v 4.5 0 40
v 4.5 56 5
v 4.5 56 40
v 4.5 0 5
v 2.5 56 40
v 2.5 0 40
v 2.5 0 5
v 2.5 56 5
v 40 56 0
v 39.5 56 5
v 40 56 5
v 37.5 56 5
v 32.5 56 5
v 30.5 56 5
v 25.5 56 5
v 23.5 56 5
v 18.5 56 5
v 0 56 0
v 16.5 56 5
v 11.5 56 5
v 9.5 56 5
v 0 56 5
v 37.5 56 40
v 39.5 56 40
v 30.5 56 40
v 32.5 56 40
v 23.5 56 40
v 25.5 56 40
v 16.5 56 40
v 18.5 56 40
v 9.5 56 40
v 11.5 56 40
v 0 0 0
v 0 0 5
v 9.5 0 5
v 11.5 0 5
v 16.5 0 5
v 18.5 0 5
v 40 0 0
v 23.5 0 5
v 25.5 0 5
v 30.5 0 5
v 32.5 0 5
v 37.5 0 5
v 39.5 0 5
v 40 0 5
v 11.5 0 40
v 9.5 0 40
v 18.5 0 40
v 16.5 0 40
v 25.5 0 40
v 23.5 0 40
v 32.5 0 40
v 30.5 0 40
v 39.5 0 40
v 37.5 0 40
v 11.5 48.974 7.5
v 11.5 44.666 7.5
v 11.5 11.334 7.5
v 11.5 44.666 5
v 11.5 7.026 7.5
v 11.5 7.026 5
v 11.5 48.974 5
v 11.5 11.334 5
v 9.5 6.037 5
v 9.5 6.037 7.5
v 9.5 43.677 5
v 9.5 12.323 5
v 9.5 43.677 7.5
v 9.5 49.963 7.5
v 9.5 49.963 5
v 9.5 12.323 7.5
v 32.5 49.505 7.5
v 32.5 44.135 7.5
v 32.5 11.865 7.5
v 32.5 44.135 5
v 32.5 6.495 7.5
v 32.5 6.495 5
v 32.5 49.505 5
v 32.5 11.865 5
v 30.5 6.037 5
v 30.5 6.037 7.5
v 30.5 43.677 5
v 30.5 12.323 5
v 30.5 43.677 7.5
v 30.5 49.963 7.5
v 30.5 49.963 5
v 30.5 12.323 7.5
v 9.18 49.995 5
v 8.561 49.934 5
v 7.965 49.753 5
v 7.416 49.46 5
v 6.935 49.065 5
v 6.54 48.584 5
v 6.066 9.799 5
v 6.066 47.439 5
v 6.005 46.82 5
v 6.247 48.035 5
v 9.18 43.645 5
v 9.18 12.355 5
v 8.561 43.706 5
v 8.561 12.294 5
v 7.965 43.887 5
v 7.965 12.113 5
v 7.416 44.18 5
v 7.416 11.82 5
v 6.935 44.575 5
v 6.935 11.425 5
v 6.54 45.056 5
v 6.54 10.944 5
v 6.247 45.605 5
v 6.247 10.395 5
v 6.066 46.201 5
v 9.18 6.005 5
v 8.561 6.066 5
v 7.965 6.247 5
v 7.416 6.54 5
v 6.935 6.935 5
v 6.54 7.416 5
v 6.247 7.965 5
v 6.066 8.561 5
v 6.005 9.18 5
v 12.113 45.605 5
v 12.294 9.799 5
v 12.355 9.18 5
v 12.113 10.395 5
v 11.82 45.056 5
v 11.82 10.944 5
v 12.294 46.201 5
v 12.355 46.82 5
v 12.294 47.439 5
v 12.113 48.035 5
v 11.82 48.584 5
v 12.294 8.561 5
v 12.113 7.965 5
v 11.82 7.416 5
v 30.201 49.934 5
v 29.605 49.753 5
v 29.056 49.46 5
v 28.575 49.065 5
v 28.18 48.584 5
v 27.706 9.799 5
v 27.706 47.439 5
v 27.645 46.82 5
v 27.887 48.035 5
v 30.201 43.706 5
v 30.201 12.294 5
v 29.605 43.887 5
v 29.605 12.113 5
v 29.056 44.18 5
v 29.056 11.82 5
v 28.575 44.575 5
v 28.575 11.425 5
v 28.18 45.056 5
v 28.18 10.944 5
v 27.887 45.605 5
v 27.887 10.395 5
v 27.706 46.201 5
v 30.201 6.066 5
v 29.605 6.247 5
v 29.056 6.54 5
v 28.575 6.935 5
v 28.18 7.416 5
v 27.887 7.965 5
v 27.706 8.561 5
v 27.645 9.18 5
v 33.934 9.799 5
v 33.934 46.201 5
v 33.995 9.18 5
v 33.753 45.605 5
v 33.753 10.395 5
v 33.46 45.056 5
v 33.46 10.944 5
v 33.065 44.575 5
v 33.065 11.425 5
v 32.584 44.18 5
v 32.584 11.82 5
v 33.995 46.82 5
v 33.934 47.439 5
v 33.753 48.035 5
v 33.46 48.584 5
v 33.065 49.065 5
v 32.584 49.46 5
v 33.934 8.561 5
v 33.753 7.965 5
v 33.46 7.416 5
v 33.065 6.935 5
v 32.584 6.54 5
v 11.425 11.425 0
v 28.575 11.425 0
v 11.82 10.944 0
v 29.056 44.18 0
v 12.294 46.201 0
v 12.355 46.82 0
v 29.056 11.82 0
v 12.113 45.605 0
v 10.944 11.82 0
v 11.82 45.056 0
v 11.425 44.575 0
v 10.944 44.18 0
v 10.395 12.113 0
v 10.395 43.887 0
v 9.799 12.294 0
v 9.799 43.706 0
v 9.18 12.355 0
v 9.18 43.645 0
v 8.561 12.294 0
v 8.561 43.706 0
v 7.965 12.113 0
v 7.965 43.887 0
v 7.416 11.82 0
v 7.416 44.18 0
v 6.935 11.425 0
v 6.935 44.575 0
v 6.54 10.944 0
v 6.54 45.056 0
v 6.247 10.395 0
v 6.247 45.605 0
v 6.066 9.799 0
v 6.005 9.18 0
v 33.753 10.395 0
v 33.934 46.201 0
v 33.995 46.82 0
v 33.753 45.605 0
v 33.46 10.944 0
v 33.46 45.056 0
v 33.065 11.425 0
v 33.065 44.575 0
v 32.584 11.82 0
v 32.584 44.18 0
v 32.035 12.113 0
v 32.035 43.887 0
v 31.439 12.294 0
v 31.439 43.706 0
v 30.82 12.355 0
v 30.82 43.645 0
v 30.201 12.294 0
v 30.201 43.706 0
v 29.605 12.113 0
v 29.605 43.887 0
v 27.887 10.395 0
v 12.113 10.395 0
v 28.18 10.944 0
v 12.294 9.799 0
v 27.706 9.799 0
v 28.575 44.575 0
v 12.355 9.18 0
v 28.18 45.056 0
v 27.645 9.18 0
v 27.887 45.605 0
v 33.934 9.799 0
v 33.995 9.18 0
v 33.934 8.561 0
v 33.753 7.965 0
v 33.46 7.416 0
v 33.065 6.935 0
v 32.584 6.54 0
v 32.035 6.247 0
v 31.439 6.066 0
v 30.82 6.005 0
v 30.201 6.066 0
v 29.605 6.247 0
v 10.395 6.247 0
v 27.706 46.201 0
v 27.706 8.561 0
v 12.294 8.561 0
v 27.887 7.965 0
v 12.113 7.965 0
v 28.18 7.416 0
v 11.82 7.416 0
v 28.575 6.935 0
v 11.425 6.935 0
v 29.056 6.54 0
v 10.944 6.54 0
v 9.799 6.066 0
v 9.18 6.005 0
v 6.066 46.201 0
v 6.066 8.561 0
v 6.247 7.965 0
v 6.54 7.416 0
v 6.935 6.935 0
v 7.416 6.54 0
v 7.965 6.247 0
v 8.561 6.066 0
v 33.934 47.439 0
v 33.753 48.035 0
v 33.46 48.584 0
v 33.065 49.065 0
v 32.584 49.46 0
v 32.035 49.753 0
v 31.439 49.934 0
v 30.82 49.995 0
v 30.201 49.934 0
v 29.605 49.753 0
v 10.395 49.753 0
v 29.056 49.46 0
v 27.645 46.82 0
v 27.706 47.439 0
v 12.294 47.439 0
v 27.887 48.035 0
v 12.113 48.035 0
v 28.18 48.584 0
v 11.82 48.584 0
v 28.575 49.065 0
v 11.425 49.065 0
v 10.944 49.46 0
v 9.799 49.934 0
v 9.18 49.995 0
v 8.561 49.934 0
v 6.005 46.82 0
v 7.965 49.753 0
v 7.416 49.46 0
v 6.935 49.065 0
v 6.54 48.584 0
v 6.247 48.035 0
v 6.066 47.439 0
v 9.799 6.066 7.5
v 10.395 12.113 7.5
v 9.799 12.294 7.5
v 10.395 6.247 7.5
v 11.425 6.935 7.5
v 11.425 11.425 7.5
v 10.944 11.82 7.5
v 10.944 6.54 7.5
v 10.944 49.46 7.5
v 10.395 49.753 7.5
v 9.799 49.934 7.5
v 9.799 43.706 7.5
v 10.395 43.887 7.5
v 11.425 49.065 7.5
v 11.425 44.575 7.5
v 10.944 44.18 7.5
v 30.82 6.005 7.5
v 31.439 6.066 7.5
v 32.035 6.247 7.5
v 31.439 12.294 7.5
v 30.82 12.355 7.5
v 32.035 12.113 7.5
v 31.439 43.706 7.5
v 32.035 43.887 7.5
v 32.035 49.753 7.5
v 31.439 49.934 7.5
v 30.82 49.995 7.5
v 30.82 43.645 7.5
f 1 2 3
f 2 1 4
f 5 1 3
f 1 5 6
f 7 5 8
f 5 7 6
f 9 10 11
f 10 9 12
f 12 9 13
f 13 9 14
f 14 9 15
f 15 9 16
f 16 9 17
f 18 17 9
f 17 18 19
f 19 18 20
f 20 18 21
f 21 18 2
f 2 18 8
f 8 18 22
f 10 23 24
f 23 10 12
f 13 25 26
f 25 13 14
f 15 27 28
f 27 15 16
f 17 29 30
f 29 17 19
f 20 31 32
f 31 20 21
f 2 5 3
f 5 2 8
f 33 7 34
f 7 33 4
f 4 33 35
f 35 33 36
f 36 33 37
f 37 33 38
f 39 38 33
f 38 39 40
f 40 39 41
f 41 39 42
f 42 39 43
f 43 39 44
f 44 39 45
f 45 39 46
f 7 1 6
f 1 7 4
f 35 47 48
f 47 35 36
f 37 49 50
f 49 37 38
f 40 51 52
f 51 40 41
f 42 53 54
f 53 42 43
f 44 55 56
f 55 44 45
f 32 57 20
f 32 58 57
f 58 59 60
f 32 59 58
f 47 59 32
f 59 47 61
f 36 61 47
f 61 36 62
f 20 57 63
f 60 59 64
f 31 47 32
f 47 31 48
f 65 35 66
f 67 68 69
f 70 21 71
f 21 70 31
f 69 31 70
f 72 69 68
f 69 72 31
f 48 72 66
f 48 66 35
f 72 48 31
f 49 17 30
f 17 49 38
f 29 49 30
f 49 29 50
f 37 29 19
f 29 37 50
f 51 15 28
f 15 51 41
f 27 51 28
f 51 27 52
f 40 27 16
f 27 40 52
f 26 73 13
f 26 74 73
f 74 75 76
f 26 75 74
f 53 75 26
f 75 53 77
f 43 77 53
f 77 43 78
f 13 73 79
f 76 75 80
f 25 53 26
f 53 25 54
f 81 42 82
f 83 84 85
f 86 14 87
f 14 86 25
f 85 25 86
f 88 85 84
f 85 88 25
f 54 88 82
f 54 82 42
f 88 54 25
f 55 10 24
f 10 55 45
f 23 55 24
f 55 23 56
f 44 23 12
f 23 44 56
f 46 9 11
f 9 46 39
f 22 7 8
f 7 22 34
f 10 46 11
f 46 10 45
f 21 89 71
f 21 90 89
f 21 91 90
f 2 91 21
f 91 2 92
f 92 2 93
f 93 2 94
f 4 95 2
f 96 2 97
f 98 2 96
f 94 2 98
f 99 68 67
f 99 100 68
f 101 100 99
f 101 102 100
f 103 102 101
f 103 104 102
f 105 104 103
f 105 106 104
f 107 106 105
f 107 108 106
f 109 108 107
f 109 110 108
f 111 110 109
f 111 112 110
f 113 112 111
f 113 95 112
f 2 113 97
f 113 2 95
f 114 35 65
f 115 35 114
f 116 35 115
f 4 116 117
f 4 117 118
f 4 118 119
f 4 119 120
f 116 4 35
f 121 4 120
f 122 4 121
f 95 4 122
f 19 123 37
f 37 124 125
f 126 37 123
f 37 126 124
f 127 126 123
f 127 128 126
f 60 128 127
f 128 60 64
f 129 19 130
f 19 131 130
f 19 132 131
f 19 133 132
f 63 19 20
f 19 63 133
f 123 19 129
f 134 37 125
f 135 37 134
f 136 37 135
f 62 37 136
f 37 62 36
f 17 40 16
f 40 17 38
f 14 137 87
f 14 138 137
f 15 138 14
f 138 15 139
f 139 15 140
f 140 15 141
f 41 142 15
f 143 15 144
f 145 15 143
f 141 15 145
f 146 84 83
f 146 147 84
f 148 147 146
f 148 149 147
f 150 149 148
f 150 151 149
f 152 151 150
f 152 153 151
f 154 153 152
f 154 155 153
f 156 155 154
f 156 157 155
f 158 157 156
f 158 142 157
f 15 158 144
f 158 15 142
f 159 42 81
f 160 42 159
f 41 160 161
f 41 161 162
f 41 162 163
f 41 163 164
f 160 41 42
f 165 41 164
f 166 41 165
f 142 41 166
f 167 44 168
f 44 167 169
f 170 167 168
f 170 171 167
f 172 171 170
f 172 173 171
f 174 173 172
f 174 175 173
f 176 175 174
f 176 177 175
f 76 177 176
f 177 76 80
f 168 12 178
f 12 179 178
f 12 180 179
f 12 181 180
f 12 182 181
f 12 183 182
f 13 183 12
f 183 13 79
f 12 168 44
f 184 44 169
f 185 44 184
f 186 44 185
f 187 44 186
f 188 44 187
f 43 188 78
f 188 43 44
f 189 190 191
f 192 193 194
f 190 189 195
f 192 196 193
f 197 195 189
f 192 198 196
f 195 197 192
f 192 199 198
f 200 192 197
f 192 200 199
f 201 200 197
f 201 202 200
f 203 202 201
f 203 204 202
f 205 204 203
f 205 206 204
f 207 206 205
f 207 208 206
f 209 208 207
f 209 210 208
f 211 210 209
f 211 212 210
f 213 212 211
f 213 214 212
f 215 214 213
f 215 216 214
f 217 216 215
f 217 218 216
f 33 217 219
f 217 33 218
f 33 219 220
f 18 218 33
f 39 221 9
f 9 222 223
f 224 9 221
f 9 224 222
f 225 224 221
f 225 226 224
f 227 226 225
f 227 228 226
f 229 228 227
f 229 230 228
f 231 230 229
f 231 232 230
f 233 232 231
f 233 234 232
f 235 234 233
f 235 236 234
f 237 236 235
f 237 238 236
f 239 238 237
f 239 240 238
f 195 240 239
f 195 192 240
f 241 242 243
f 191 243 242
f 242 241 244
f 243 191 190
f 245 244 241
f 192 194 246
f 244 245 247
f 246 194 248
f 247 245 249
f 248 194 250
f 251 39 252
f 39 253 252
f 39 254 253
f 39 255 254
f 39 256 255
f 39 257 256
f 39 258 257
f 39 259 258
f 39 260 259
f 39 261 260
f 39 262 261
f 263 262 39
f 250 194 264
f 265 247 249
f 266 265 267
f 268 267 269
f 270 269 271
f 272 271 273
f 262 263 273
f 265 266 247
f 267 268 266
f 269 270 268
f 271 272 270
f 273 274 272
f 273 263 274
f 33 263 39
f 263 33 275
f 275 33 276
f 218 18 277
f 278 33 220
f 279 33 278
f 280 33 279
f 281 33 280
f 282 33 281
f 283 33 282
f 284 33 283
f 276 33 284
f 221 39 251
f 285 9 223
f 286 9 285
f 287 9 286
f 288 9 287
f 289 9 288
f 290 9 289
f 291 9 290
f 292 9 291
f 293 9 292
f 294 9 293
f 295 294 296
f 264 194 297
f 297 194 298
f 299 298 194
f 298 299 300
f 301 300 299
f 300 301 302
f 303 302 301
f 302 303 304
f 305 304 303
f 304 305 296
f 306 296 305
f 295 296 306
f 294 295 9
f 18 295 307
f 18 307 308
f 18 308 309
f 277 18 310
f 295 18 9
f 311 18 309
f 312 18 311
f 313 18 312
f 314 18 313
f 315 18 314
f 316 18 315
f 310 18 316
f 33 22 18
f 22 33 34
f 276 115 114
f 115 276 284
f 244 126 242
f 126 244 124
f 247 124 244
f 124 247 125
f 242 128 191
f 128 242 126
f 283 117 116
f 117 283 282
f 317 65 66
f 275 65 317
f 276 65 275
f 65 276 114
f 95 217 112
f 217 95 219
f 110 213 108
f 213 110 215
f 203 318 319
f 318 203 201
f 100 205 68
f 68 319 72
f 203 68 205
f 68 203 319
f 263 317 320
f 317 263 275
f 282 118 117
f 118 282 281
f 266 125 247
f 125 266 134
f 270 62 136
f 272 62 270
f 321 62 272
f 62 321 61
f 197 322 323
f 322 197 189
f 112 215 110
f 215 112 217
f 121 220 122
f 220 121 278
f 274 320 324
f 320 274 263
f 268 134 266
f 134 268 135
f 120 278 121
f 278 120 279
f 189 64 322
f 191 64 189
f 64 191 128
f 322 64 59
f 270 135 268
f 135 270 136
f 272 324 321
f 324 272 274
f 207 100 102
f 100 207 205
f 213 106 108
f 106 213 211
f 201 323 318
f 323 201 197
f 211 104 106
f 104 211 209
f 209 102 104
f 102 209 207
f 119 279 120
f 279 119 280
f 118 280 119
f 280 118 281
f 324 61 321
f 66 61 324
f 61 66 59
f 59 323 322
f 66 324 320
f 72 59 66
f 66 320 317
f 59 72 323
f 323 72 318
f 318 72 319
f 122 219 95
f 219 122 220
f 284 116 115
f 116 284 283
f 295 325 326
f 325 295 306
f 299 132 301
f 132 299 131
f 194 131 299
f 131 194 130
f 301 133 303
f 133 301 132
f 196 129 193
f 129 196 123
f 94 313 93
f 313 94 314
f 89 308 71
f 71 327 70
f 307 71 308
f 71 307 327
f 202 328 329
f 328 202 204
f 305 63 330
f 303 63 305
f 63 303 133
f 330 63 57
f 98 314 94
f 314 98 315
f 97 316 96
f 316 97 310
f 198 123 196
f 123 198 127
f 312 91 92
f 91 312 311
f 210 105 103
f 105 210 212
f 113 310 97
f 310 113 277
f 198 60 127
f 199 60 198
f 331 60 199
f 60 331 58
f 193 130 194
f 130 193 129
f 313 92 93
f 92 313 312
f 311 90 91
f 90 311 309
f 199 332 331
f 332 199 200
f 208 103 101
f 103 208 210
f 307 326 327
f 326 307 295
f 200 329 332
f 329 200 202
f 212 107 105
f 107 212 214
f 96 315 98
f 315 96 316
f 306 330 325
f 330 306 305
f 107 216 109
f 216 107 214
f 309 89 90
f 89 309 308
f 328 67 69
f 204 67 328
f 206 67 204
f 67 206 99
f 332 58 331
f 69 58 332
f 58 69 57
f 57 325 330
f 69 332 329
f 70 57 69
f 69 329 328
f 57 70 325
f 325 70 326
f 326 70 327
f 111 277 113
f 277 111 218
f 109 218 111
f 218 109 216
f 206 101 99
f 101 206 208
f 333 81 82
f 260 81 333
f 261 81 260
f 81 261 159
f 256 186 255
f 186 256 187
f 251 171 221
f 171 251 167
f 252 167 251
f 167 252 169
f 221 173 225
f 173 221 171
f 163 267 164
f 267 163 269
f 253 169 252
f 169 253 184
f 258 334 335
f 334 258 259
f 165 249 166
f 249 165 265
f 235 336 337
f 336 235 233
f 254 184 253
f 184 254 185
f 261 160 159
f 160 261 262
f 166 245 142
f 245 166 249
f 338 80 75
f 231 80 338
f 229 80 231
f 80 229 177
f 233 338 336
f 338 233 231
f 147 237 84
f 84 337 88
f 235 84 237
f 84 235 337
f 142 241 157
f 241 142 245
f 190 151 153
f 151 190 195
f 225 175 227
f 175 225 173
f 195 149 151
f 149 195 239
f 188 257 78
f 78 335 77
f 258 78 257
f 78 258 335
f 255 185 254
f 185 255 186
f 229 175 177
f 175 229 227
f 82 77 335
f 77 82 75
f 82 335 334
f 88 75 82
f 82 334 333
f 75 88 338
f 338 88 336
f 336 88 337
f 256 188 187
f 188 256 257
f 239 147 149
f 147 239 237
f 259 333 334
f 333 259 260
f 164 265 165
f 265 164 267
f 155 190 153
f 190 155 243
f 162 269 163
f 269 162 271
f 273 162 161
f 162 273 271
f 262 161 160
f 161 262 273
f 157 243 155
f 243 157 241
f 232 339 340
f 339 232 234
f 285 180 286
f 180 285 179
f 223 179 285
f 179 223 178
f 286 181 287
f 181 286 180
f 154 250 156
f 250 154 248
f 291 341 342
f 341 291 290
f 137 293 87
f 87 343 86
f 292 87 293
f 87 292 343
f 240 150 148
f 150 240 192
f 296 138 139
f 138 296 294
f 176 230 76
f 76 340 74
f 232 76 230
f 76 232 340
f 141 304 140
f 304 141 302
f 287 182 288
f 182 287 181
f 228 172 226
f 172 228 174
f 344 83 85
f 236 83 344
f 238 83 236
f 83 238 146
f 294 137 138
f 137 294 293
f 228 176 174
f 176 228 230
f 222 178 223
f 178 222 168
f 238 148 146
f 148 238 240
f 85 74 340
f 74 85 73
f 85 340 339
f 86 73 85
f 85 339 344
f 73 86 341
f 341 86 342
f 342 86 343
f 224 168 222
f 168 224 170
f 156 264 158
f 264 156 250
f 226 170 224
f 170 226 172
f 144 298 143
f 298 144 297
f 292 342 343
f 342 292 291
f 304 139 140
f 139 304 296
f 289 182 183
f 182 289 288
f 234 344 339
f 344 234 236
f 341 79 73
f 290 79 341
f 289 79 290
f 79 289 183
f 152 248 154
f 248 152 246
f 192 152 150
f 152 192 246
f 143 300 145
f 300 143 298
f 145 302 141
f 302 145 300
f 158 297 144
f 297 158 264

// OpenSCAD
$fn = 32;

// ----------------------------------------------------------------------
// Finned heat sink: 40 x 56 mm base, 35 mm fins
// ----------------------------------------------------------------------

// --- parameters (mm) ---
base_w = 40;              // base width
base_d = 56;              // base depth
base_t = 5;               // base thickness
fin_h = 35;               // fin height above the base
holes_d = 6.35;           // fixing holes
hole_x = 10.82;           // hole offset in x
hole_y = 18.82;           // hole offset in y
fin_t = 2;                // fin thickness
fin_pitch = 7;            // fin pitch
fin_count = 6;            // number of fins
fin_x0 = 2.5;             // first fin offset

difference() {
  union() {
    cube([base_w, base_d, base_t]);
    for (i = [0 : fin_count - 1]) {
      translate([fin_x0 + i * fin_pitch, 0, base_t - 0.5]) cube([fin_t, base_d, fin_h + 0.5]);
    }
  }
  /* fixing holes through the base, 2.5 mm clear on both sides */
  for (hx = [-10.82, 10.82]) {
    for (hy = [-18.82, 18.82]) {
      translate([base_w / 2 + hx, base_d / 2 + hy, -2.5]) cylinder(h = base_t + 5, d = holes_d);
    }
  }
}
